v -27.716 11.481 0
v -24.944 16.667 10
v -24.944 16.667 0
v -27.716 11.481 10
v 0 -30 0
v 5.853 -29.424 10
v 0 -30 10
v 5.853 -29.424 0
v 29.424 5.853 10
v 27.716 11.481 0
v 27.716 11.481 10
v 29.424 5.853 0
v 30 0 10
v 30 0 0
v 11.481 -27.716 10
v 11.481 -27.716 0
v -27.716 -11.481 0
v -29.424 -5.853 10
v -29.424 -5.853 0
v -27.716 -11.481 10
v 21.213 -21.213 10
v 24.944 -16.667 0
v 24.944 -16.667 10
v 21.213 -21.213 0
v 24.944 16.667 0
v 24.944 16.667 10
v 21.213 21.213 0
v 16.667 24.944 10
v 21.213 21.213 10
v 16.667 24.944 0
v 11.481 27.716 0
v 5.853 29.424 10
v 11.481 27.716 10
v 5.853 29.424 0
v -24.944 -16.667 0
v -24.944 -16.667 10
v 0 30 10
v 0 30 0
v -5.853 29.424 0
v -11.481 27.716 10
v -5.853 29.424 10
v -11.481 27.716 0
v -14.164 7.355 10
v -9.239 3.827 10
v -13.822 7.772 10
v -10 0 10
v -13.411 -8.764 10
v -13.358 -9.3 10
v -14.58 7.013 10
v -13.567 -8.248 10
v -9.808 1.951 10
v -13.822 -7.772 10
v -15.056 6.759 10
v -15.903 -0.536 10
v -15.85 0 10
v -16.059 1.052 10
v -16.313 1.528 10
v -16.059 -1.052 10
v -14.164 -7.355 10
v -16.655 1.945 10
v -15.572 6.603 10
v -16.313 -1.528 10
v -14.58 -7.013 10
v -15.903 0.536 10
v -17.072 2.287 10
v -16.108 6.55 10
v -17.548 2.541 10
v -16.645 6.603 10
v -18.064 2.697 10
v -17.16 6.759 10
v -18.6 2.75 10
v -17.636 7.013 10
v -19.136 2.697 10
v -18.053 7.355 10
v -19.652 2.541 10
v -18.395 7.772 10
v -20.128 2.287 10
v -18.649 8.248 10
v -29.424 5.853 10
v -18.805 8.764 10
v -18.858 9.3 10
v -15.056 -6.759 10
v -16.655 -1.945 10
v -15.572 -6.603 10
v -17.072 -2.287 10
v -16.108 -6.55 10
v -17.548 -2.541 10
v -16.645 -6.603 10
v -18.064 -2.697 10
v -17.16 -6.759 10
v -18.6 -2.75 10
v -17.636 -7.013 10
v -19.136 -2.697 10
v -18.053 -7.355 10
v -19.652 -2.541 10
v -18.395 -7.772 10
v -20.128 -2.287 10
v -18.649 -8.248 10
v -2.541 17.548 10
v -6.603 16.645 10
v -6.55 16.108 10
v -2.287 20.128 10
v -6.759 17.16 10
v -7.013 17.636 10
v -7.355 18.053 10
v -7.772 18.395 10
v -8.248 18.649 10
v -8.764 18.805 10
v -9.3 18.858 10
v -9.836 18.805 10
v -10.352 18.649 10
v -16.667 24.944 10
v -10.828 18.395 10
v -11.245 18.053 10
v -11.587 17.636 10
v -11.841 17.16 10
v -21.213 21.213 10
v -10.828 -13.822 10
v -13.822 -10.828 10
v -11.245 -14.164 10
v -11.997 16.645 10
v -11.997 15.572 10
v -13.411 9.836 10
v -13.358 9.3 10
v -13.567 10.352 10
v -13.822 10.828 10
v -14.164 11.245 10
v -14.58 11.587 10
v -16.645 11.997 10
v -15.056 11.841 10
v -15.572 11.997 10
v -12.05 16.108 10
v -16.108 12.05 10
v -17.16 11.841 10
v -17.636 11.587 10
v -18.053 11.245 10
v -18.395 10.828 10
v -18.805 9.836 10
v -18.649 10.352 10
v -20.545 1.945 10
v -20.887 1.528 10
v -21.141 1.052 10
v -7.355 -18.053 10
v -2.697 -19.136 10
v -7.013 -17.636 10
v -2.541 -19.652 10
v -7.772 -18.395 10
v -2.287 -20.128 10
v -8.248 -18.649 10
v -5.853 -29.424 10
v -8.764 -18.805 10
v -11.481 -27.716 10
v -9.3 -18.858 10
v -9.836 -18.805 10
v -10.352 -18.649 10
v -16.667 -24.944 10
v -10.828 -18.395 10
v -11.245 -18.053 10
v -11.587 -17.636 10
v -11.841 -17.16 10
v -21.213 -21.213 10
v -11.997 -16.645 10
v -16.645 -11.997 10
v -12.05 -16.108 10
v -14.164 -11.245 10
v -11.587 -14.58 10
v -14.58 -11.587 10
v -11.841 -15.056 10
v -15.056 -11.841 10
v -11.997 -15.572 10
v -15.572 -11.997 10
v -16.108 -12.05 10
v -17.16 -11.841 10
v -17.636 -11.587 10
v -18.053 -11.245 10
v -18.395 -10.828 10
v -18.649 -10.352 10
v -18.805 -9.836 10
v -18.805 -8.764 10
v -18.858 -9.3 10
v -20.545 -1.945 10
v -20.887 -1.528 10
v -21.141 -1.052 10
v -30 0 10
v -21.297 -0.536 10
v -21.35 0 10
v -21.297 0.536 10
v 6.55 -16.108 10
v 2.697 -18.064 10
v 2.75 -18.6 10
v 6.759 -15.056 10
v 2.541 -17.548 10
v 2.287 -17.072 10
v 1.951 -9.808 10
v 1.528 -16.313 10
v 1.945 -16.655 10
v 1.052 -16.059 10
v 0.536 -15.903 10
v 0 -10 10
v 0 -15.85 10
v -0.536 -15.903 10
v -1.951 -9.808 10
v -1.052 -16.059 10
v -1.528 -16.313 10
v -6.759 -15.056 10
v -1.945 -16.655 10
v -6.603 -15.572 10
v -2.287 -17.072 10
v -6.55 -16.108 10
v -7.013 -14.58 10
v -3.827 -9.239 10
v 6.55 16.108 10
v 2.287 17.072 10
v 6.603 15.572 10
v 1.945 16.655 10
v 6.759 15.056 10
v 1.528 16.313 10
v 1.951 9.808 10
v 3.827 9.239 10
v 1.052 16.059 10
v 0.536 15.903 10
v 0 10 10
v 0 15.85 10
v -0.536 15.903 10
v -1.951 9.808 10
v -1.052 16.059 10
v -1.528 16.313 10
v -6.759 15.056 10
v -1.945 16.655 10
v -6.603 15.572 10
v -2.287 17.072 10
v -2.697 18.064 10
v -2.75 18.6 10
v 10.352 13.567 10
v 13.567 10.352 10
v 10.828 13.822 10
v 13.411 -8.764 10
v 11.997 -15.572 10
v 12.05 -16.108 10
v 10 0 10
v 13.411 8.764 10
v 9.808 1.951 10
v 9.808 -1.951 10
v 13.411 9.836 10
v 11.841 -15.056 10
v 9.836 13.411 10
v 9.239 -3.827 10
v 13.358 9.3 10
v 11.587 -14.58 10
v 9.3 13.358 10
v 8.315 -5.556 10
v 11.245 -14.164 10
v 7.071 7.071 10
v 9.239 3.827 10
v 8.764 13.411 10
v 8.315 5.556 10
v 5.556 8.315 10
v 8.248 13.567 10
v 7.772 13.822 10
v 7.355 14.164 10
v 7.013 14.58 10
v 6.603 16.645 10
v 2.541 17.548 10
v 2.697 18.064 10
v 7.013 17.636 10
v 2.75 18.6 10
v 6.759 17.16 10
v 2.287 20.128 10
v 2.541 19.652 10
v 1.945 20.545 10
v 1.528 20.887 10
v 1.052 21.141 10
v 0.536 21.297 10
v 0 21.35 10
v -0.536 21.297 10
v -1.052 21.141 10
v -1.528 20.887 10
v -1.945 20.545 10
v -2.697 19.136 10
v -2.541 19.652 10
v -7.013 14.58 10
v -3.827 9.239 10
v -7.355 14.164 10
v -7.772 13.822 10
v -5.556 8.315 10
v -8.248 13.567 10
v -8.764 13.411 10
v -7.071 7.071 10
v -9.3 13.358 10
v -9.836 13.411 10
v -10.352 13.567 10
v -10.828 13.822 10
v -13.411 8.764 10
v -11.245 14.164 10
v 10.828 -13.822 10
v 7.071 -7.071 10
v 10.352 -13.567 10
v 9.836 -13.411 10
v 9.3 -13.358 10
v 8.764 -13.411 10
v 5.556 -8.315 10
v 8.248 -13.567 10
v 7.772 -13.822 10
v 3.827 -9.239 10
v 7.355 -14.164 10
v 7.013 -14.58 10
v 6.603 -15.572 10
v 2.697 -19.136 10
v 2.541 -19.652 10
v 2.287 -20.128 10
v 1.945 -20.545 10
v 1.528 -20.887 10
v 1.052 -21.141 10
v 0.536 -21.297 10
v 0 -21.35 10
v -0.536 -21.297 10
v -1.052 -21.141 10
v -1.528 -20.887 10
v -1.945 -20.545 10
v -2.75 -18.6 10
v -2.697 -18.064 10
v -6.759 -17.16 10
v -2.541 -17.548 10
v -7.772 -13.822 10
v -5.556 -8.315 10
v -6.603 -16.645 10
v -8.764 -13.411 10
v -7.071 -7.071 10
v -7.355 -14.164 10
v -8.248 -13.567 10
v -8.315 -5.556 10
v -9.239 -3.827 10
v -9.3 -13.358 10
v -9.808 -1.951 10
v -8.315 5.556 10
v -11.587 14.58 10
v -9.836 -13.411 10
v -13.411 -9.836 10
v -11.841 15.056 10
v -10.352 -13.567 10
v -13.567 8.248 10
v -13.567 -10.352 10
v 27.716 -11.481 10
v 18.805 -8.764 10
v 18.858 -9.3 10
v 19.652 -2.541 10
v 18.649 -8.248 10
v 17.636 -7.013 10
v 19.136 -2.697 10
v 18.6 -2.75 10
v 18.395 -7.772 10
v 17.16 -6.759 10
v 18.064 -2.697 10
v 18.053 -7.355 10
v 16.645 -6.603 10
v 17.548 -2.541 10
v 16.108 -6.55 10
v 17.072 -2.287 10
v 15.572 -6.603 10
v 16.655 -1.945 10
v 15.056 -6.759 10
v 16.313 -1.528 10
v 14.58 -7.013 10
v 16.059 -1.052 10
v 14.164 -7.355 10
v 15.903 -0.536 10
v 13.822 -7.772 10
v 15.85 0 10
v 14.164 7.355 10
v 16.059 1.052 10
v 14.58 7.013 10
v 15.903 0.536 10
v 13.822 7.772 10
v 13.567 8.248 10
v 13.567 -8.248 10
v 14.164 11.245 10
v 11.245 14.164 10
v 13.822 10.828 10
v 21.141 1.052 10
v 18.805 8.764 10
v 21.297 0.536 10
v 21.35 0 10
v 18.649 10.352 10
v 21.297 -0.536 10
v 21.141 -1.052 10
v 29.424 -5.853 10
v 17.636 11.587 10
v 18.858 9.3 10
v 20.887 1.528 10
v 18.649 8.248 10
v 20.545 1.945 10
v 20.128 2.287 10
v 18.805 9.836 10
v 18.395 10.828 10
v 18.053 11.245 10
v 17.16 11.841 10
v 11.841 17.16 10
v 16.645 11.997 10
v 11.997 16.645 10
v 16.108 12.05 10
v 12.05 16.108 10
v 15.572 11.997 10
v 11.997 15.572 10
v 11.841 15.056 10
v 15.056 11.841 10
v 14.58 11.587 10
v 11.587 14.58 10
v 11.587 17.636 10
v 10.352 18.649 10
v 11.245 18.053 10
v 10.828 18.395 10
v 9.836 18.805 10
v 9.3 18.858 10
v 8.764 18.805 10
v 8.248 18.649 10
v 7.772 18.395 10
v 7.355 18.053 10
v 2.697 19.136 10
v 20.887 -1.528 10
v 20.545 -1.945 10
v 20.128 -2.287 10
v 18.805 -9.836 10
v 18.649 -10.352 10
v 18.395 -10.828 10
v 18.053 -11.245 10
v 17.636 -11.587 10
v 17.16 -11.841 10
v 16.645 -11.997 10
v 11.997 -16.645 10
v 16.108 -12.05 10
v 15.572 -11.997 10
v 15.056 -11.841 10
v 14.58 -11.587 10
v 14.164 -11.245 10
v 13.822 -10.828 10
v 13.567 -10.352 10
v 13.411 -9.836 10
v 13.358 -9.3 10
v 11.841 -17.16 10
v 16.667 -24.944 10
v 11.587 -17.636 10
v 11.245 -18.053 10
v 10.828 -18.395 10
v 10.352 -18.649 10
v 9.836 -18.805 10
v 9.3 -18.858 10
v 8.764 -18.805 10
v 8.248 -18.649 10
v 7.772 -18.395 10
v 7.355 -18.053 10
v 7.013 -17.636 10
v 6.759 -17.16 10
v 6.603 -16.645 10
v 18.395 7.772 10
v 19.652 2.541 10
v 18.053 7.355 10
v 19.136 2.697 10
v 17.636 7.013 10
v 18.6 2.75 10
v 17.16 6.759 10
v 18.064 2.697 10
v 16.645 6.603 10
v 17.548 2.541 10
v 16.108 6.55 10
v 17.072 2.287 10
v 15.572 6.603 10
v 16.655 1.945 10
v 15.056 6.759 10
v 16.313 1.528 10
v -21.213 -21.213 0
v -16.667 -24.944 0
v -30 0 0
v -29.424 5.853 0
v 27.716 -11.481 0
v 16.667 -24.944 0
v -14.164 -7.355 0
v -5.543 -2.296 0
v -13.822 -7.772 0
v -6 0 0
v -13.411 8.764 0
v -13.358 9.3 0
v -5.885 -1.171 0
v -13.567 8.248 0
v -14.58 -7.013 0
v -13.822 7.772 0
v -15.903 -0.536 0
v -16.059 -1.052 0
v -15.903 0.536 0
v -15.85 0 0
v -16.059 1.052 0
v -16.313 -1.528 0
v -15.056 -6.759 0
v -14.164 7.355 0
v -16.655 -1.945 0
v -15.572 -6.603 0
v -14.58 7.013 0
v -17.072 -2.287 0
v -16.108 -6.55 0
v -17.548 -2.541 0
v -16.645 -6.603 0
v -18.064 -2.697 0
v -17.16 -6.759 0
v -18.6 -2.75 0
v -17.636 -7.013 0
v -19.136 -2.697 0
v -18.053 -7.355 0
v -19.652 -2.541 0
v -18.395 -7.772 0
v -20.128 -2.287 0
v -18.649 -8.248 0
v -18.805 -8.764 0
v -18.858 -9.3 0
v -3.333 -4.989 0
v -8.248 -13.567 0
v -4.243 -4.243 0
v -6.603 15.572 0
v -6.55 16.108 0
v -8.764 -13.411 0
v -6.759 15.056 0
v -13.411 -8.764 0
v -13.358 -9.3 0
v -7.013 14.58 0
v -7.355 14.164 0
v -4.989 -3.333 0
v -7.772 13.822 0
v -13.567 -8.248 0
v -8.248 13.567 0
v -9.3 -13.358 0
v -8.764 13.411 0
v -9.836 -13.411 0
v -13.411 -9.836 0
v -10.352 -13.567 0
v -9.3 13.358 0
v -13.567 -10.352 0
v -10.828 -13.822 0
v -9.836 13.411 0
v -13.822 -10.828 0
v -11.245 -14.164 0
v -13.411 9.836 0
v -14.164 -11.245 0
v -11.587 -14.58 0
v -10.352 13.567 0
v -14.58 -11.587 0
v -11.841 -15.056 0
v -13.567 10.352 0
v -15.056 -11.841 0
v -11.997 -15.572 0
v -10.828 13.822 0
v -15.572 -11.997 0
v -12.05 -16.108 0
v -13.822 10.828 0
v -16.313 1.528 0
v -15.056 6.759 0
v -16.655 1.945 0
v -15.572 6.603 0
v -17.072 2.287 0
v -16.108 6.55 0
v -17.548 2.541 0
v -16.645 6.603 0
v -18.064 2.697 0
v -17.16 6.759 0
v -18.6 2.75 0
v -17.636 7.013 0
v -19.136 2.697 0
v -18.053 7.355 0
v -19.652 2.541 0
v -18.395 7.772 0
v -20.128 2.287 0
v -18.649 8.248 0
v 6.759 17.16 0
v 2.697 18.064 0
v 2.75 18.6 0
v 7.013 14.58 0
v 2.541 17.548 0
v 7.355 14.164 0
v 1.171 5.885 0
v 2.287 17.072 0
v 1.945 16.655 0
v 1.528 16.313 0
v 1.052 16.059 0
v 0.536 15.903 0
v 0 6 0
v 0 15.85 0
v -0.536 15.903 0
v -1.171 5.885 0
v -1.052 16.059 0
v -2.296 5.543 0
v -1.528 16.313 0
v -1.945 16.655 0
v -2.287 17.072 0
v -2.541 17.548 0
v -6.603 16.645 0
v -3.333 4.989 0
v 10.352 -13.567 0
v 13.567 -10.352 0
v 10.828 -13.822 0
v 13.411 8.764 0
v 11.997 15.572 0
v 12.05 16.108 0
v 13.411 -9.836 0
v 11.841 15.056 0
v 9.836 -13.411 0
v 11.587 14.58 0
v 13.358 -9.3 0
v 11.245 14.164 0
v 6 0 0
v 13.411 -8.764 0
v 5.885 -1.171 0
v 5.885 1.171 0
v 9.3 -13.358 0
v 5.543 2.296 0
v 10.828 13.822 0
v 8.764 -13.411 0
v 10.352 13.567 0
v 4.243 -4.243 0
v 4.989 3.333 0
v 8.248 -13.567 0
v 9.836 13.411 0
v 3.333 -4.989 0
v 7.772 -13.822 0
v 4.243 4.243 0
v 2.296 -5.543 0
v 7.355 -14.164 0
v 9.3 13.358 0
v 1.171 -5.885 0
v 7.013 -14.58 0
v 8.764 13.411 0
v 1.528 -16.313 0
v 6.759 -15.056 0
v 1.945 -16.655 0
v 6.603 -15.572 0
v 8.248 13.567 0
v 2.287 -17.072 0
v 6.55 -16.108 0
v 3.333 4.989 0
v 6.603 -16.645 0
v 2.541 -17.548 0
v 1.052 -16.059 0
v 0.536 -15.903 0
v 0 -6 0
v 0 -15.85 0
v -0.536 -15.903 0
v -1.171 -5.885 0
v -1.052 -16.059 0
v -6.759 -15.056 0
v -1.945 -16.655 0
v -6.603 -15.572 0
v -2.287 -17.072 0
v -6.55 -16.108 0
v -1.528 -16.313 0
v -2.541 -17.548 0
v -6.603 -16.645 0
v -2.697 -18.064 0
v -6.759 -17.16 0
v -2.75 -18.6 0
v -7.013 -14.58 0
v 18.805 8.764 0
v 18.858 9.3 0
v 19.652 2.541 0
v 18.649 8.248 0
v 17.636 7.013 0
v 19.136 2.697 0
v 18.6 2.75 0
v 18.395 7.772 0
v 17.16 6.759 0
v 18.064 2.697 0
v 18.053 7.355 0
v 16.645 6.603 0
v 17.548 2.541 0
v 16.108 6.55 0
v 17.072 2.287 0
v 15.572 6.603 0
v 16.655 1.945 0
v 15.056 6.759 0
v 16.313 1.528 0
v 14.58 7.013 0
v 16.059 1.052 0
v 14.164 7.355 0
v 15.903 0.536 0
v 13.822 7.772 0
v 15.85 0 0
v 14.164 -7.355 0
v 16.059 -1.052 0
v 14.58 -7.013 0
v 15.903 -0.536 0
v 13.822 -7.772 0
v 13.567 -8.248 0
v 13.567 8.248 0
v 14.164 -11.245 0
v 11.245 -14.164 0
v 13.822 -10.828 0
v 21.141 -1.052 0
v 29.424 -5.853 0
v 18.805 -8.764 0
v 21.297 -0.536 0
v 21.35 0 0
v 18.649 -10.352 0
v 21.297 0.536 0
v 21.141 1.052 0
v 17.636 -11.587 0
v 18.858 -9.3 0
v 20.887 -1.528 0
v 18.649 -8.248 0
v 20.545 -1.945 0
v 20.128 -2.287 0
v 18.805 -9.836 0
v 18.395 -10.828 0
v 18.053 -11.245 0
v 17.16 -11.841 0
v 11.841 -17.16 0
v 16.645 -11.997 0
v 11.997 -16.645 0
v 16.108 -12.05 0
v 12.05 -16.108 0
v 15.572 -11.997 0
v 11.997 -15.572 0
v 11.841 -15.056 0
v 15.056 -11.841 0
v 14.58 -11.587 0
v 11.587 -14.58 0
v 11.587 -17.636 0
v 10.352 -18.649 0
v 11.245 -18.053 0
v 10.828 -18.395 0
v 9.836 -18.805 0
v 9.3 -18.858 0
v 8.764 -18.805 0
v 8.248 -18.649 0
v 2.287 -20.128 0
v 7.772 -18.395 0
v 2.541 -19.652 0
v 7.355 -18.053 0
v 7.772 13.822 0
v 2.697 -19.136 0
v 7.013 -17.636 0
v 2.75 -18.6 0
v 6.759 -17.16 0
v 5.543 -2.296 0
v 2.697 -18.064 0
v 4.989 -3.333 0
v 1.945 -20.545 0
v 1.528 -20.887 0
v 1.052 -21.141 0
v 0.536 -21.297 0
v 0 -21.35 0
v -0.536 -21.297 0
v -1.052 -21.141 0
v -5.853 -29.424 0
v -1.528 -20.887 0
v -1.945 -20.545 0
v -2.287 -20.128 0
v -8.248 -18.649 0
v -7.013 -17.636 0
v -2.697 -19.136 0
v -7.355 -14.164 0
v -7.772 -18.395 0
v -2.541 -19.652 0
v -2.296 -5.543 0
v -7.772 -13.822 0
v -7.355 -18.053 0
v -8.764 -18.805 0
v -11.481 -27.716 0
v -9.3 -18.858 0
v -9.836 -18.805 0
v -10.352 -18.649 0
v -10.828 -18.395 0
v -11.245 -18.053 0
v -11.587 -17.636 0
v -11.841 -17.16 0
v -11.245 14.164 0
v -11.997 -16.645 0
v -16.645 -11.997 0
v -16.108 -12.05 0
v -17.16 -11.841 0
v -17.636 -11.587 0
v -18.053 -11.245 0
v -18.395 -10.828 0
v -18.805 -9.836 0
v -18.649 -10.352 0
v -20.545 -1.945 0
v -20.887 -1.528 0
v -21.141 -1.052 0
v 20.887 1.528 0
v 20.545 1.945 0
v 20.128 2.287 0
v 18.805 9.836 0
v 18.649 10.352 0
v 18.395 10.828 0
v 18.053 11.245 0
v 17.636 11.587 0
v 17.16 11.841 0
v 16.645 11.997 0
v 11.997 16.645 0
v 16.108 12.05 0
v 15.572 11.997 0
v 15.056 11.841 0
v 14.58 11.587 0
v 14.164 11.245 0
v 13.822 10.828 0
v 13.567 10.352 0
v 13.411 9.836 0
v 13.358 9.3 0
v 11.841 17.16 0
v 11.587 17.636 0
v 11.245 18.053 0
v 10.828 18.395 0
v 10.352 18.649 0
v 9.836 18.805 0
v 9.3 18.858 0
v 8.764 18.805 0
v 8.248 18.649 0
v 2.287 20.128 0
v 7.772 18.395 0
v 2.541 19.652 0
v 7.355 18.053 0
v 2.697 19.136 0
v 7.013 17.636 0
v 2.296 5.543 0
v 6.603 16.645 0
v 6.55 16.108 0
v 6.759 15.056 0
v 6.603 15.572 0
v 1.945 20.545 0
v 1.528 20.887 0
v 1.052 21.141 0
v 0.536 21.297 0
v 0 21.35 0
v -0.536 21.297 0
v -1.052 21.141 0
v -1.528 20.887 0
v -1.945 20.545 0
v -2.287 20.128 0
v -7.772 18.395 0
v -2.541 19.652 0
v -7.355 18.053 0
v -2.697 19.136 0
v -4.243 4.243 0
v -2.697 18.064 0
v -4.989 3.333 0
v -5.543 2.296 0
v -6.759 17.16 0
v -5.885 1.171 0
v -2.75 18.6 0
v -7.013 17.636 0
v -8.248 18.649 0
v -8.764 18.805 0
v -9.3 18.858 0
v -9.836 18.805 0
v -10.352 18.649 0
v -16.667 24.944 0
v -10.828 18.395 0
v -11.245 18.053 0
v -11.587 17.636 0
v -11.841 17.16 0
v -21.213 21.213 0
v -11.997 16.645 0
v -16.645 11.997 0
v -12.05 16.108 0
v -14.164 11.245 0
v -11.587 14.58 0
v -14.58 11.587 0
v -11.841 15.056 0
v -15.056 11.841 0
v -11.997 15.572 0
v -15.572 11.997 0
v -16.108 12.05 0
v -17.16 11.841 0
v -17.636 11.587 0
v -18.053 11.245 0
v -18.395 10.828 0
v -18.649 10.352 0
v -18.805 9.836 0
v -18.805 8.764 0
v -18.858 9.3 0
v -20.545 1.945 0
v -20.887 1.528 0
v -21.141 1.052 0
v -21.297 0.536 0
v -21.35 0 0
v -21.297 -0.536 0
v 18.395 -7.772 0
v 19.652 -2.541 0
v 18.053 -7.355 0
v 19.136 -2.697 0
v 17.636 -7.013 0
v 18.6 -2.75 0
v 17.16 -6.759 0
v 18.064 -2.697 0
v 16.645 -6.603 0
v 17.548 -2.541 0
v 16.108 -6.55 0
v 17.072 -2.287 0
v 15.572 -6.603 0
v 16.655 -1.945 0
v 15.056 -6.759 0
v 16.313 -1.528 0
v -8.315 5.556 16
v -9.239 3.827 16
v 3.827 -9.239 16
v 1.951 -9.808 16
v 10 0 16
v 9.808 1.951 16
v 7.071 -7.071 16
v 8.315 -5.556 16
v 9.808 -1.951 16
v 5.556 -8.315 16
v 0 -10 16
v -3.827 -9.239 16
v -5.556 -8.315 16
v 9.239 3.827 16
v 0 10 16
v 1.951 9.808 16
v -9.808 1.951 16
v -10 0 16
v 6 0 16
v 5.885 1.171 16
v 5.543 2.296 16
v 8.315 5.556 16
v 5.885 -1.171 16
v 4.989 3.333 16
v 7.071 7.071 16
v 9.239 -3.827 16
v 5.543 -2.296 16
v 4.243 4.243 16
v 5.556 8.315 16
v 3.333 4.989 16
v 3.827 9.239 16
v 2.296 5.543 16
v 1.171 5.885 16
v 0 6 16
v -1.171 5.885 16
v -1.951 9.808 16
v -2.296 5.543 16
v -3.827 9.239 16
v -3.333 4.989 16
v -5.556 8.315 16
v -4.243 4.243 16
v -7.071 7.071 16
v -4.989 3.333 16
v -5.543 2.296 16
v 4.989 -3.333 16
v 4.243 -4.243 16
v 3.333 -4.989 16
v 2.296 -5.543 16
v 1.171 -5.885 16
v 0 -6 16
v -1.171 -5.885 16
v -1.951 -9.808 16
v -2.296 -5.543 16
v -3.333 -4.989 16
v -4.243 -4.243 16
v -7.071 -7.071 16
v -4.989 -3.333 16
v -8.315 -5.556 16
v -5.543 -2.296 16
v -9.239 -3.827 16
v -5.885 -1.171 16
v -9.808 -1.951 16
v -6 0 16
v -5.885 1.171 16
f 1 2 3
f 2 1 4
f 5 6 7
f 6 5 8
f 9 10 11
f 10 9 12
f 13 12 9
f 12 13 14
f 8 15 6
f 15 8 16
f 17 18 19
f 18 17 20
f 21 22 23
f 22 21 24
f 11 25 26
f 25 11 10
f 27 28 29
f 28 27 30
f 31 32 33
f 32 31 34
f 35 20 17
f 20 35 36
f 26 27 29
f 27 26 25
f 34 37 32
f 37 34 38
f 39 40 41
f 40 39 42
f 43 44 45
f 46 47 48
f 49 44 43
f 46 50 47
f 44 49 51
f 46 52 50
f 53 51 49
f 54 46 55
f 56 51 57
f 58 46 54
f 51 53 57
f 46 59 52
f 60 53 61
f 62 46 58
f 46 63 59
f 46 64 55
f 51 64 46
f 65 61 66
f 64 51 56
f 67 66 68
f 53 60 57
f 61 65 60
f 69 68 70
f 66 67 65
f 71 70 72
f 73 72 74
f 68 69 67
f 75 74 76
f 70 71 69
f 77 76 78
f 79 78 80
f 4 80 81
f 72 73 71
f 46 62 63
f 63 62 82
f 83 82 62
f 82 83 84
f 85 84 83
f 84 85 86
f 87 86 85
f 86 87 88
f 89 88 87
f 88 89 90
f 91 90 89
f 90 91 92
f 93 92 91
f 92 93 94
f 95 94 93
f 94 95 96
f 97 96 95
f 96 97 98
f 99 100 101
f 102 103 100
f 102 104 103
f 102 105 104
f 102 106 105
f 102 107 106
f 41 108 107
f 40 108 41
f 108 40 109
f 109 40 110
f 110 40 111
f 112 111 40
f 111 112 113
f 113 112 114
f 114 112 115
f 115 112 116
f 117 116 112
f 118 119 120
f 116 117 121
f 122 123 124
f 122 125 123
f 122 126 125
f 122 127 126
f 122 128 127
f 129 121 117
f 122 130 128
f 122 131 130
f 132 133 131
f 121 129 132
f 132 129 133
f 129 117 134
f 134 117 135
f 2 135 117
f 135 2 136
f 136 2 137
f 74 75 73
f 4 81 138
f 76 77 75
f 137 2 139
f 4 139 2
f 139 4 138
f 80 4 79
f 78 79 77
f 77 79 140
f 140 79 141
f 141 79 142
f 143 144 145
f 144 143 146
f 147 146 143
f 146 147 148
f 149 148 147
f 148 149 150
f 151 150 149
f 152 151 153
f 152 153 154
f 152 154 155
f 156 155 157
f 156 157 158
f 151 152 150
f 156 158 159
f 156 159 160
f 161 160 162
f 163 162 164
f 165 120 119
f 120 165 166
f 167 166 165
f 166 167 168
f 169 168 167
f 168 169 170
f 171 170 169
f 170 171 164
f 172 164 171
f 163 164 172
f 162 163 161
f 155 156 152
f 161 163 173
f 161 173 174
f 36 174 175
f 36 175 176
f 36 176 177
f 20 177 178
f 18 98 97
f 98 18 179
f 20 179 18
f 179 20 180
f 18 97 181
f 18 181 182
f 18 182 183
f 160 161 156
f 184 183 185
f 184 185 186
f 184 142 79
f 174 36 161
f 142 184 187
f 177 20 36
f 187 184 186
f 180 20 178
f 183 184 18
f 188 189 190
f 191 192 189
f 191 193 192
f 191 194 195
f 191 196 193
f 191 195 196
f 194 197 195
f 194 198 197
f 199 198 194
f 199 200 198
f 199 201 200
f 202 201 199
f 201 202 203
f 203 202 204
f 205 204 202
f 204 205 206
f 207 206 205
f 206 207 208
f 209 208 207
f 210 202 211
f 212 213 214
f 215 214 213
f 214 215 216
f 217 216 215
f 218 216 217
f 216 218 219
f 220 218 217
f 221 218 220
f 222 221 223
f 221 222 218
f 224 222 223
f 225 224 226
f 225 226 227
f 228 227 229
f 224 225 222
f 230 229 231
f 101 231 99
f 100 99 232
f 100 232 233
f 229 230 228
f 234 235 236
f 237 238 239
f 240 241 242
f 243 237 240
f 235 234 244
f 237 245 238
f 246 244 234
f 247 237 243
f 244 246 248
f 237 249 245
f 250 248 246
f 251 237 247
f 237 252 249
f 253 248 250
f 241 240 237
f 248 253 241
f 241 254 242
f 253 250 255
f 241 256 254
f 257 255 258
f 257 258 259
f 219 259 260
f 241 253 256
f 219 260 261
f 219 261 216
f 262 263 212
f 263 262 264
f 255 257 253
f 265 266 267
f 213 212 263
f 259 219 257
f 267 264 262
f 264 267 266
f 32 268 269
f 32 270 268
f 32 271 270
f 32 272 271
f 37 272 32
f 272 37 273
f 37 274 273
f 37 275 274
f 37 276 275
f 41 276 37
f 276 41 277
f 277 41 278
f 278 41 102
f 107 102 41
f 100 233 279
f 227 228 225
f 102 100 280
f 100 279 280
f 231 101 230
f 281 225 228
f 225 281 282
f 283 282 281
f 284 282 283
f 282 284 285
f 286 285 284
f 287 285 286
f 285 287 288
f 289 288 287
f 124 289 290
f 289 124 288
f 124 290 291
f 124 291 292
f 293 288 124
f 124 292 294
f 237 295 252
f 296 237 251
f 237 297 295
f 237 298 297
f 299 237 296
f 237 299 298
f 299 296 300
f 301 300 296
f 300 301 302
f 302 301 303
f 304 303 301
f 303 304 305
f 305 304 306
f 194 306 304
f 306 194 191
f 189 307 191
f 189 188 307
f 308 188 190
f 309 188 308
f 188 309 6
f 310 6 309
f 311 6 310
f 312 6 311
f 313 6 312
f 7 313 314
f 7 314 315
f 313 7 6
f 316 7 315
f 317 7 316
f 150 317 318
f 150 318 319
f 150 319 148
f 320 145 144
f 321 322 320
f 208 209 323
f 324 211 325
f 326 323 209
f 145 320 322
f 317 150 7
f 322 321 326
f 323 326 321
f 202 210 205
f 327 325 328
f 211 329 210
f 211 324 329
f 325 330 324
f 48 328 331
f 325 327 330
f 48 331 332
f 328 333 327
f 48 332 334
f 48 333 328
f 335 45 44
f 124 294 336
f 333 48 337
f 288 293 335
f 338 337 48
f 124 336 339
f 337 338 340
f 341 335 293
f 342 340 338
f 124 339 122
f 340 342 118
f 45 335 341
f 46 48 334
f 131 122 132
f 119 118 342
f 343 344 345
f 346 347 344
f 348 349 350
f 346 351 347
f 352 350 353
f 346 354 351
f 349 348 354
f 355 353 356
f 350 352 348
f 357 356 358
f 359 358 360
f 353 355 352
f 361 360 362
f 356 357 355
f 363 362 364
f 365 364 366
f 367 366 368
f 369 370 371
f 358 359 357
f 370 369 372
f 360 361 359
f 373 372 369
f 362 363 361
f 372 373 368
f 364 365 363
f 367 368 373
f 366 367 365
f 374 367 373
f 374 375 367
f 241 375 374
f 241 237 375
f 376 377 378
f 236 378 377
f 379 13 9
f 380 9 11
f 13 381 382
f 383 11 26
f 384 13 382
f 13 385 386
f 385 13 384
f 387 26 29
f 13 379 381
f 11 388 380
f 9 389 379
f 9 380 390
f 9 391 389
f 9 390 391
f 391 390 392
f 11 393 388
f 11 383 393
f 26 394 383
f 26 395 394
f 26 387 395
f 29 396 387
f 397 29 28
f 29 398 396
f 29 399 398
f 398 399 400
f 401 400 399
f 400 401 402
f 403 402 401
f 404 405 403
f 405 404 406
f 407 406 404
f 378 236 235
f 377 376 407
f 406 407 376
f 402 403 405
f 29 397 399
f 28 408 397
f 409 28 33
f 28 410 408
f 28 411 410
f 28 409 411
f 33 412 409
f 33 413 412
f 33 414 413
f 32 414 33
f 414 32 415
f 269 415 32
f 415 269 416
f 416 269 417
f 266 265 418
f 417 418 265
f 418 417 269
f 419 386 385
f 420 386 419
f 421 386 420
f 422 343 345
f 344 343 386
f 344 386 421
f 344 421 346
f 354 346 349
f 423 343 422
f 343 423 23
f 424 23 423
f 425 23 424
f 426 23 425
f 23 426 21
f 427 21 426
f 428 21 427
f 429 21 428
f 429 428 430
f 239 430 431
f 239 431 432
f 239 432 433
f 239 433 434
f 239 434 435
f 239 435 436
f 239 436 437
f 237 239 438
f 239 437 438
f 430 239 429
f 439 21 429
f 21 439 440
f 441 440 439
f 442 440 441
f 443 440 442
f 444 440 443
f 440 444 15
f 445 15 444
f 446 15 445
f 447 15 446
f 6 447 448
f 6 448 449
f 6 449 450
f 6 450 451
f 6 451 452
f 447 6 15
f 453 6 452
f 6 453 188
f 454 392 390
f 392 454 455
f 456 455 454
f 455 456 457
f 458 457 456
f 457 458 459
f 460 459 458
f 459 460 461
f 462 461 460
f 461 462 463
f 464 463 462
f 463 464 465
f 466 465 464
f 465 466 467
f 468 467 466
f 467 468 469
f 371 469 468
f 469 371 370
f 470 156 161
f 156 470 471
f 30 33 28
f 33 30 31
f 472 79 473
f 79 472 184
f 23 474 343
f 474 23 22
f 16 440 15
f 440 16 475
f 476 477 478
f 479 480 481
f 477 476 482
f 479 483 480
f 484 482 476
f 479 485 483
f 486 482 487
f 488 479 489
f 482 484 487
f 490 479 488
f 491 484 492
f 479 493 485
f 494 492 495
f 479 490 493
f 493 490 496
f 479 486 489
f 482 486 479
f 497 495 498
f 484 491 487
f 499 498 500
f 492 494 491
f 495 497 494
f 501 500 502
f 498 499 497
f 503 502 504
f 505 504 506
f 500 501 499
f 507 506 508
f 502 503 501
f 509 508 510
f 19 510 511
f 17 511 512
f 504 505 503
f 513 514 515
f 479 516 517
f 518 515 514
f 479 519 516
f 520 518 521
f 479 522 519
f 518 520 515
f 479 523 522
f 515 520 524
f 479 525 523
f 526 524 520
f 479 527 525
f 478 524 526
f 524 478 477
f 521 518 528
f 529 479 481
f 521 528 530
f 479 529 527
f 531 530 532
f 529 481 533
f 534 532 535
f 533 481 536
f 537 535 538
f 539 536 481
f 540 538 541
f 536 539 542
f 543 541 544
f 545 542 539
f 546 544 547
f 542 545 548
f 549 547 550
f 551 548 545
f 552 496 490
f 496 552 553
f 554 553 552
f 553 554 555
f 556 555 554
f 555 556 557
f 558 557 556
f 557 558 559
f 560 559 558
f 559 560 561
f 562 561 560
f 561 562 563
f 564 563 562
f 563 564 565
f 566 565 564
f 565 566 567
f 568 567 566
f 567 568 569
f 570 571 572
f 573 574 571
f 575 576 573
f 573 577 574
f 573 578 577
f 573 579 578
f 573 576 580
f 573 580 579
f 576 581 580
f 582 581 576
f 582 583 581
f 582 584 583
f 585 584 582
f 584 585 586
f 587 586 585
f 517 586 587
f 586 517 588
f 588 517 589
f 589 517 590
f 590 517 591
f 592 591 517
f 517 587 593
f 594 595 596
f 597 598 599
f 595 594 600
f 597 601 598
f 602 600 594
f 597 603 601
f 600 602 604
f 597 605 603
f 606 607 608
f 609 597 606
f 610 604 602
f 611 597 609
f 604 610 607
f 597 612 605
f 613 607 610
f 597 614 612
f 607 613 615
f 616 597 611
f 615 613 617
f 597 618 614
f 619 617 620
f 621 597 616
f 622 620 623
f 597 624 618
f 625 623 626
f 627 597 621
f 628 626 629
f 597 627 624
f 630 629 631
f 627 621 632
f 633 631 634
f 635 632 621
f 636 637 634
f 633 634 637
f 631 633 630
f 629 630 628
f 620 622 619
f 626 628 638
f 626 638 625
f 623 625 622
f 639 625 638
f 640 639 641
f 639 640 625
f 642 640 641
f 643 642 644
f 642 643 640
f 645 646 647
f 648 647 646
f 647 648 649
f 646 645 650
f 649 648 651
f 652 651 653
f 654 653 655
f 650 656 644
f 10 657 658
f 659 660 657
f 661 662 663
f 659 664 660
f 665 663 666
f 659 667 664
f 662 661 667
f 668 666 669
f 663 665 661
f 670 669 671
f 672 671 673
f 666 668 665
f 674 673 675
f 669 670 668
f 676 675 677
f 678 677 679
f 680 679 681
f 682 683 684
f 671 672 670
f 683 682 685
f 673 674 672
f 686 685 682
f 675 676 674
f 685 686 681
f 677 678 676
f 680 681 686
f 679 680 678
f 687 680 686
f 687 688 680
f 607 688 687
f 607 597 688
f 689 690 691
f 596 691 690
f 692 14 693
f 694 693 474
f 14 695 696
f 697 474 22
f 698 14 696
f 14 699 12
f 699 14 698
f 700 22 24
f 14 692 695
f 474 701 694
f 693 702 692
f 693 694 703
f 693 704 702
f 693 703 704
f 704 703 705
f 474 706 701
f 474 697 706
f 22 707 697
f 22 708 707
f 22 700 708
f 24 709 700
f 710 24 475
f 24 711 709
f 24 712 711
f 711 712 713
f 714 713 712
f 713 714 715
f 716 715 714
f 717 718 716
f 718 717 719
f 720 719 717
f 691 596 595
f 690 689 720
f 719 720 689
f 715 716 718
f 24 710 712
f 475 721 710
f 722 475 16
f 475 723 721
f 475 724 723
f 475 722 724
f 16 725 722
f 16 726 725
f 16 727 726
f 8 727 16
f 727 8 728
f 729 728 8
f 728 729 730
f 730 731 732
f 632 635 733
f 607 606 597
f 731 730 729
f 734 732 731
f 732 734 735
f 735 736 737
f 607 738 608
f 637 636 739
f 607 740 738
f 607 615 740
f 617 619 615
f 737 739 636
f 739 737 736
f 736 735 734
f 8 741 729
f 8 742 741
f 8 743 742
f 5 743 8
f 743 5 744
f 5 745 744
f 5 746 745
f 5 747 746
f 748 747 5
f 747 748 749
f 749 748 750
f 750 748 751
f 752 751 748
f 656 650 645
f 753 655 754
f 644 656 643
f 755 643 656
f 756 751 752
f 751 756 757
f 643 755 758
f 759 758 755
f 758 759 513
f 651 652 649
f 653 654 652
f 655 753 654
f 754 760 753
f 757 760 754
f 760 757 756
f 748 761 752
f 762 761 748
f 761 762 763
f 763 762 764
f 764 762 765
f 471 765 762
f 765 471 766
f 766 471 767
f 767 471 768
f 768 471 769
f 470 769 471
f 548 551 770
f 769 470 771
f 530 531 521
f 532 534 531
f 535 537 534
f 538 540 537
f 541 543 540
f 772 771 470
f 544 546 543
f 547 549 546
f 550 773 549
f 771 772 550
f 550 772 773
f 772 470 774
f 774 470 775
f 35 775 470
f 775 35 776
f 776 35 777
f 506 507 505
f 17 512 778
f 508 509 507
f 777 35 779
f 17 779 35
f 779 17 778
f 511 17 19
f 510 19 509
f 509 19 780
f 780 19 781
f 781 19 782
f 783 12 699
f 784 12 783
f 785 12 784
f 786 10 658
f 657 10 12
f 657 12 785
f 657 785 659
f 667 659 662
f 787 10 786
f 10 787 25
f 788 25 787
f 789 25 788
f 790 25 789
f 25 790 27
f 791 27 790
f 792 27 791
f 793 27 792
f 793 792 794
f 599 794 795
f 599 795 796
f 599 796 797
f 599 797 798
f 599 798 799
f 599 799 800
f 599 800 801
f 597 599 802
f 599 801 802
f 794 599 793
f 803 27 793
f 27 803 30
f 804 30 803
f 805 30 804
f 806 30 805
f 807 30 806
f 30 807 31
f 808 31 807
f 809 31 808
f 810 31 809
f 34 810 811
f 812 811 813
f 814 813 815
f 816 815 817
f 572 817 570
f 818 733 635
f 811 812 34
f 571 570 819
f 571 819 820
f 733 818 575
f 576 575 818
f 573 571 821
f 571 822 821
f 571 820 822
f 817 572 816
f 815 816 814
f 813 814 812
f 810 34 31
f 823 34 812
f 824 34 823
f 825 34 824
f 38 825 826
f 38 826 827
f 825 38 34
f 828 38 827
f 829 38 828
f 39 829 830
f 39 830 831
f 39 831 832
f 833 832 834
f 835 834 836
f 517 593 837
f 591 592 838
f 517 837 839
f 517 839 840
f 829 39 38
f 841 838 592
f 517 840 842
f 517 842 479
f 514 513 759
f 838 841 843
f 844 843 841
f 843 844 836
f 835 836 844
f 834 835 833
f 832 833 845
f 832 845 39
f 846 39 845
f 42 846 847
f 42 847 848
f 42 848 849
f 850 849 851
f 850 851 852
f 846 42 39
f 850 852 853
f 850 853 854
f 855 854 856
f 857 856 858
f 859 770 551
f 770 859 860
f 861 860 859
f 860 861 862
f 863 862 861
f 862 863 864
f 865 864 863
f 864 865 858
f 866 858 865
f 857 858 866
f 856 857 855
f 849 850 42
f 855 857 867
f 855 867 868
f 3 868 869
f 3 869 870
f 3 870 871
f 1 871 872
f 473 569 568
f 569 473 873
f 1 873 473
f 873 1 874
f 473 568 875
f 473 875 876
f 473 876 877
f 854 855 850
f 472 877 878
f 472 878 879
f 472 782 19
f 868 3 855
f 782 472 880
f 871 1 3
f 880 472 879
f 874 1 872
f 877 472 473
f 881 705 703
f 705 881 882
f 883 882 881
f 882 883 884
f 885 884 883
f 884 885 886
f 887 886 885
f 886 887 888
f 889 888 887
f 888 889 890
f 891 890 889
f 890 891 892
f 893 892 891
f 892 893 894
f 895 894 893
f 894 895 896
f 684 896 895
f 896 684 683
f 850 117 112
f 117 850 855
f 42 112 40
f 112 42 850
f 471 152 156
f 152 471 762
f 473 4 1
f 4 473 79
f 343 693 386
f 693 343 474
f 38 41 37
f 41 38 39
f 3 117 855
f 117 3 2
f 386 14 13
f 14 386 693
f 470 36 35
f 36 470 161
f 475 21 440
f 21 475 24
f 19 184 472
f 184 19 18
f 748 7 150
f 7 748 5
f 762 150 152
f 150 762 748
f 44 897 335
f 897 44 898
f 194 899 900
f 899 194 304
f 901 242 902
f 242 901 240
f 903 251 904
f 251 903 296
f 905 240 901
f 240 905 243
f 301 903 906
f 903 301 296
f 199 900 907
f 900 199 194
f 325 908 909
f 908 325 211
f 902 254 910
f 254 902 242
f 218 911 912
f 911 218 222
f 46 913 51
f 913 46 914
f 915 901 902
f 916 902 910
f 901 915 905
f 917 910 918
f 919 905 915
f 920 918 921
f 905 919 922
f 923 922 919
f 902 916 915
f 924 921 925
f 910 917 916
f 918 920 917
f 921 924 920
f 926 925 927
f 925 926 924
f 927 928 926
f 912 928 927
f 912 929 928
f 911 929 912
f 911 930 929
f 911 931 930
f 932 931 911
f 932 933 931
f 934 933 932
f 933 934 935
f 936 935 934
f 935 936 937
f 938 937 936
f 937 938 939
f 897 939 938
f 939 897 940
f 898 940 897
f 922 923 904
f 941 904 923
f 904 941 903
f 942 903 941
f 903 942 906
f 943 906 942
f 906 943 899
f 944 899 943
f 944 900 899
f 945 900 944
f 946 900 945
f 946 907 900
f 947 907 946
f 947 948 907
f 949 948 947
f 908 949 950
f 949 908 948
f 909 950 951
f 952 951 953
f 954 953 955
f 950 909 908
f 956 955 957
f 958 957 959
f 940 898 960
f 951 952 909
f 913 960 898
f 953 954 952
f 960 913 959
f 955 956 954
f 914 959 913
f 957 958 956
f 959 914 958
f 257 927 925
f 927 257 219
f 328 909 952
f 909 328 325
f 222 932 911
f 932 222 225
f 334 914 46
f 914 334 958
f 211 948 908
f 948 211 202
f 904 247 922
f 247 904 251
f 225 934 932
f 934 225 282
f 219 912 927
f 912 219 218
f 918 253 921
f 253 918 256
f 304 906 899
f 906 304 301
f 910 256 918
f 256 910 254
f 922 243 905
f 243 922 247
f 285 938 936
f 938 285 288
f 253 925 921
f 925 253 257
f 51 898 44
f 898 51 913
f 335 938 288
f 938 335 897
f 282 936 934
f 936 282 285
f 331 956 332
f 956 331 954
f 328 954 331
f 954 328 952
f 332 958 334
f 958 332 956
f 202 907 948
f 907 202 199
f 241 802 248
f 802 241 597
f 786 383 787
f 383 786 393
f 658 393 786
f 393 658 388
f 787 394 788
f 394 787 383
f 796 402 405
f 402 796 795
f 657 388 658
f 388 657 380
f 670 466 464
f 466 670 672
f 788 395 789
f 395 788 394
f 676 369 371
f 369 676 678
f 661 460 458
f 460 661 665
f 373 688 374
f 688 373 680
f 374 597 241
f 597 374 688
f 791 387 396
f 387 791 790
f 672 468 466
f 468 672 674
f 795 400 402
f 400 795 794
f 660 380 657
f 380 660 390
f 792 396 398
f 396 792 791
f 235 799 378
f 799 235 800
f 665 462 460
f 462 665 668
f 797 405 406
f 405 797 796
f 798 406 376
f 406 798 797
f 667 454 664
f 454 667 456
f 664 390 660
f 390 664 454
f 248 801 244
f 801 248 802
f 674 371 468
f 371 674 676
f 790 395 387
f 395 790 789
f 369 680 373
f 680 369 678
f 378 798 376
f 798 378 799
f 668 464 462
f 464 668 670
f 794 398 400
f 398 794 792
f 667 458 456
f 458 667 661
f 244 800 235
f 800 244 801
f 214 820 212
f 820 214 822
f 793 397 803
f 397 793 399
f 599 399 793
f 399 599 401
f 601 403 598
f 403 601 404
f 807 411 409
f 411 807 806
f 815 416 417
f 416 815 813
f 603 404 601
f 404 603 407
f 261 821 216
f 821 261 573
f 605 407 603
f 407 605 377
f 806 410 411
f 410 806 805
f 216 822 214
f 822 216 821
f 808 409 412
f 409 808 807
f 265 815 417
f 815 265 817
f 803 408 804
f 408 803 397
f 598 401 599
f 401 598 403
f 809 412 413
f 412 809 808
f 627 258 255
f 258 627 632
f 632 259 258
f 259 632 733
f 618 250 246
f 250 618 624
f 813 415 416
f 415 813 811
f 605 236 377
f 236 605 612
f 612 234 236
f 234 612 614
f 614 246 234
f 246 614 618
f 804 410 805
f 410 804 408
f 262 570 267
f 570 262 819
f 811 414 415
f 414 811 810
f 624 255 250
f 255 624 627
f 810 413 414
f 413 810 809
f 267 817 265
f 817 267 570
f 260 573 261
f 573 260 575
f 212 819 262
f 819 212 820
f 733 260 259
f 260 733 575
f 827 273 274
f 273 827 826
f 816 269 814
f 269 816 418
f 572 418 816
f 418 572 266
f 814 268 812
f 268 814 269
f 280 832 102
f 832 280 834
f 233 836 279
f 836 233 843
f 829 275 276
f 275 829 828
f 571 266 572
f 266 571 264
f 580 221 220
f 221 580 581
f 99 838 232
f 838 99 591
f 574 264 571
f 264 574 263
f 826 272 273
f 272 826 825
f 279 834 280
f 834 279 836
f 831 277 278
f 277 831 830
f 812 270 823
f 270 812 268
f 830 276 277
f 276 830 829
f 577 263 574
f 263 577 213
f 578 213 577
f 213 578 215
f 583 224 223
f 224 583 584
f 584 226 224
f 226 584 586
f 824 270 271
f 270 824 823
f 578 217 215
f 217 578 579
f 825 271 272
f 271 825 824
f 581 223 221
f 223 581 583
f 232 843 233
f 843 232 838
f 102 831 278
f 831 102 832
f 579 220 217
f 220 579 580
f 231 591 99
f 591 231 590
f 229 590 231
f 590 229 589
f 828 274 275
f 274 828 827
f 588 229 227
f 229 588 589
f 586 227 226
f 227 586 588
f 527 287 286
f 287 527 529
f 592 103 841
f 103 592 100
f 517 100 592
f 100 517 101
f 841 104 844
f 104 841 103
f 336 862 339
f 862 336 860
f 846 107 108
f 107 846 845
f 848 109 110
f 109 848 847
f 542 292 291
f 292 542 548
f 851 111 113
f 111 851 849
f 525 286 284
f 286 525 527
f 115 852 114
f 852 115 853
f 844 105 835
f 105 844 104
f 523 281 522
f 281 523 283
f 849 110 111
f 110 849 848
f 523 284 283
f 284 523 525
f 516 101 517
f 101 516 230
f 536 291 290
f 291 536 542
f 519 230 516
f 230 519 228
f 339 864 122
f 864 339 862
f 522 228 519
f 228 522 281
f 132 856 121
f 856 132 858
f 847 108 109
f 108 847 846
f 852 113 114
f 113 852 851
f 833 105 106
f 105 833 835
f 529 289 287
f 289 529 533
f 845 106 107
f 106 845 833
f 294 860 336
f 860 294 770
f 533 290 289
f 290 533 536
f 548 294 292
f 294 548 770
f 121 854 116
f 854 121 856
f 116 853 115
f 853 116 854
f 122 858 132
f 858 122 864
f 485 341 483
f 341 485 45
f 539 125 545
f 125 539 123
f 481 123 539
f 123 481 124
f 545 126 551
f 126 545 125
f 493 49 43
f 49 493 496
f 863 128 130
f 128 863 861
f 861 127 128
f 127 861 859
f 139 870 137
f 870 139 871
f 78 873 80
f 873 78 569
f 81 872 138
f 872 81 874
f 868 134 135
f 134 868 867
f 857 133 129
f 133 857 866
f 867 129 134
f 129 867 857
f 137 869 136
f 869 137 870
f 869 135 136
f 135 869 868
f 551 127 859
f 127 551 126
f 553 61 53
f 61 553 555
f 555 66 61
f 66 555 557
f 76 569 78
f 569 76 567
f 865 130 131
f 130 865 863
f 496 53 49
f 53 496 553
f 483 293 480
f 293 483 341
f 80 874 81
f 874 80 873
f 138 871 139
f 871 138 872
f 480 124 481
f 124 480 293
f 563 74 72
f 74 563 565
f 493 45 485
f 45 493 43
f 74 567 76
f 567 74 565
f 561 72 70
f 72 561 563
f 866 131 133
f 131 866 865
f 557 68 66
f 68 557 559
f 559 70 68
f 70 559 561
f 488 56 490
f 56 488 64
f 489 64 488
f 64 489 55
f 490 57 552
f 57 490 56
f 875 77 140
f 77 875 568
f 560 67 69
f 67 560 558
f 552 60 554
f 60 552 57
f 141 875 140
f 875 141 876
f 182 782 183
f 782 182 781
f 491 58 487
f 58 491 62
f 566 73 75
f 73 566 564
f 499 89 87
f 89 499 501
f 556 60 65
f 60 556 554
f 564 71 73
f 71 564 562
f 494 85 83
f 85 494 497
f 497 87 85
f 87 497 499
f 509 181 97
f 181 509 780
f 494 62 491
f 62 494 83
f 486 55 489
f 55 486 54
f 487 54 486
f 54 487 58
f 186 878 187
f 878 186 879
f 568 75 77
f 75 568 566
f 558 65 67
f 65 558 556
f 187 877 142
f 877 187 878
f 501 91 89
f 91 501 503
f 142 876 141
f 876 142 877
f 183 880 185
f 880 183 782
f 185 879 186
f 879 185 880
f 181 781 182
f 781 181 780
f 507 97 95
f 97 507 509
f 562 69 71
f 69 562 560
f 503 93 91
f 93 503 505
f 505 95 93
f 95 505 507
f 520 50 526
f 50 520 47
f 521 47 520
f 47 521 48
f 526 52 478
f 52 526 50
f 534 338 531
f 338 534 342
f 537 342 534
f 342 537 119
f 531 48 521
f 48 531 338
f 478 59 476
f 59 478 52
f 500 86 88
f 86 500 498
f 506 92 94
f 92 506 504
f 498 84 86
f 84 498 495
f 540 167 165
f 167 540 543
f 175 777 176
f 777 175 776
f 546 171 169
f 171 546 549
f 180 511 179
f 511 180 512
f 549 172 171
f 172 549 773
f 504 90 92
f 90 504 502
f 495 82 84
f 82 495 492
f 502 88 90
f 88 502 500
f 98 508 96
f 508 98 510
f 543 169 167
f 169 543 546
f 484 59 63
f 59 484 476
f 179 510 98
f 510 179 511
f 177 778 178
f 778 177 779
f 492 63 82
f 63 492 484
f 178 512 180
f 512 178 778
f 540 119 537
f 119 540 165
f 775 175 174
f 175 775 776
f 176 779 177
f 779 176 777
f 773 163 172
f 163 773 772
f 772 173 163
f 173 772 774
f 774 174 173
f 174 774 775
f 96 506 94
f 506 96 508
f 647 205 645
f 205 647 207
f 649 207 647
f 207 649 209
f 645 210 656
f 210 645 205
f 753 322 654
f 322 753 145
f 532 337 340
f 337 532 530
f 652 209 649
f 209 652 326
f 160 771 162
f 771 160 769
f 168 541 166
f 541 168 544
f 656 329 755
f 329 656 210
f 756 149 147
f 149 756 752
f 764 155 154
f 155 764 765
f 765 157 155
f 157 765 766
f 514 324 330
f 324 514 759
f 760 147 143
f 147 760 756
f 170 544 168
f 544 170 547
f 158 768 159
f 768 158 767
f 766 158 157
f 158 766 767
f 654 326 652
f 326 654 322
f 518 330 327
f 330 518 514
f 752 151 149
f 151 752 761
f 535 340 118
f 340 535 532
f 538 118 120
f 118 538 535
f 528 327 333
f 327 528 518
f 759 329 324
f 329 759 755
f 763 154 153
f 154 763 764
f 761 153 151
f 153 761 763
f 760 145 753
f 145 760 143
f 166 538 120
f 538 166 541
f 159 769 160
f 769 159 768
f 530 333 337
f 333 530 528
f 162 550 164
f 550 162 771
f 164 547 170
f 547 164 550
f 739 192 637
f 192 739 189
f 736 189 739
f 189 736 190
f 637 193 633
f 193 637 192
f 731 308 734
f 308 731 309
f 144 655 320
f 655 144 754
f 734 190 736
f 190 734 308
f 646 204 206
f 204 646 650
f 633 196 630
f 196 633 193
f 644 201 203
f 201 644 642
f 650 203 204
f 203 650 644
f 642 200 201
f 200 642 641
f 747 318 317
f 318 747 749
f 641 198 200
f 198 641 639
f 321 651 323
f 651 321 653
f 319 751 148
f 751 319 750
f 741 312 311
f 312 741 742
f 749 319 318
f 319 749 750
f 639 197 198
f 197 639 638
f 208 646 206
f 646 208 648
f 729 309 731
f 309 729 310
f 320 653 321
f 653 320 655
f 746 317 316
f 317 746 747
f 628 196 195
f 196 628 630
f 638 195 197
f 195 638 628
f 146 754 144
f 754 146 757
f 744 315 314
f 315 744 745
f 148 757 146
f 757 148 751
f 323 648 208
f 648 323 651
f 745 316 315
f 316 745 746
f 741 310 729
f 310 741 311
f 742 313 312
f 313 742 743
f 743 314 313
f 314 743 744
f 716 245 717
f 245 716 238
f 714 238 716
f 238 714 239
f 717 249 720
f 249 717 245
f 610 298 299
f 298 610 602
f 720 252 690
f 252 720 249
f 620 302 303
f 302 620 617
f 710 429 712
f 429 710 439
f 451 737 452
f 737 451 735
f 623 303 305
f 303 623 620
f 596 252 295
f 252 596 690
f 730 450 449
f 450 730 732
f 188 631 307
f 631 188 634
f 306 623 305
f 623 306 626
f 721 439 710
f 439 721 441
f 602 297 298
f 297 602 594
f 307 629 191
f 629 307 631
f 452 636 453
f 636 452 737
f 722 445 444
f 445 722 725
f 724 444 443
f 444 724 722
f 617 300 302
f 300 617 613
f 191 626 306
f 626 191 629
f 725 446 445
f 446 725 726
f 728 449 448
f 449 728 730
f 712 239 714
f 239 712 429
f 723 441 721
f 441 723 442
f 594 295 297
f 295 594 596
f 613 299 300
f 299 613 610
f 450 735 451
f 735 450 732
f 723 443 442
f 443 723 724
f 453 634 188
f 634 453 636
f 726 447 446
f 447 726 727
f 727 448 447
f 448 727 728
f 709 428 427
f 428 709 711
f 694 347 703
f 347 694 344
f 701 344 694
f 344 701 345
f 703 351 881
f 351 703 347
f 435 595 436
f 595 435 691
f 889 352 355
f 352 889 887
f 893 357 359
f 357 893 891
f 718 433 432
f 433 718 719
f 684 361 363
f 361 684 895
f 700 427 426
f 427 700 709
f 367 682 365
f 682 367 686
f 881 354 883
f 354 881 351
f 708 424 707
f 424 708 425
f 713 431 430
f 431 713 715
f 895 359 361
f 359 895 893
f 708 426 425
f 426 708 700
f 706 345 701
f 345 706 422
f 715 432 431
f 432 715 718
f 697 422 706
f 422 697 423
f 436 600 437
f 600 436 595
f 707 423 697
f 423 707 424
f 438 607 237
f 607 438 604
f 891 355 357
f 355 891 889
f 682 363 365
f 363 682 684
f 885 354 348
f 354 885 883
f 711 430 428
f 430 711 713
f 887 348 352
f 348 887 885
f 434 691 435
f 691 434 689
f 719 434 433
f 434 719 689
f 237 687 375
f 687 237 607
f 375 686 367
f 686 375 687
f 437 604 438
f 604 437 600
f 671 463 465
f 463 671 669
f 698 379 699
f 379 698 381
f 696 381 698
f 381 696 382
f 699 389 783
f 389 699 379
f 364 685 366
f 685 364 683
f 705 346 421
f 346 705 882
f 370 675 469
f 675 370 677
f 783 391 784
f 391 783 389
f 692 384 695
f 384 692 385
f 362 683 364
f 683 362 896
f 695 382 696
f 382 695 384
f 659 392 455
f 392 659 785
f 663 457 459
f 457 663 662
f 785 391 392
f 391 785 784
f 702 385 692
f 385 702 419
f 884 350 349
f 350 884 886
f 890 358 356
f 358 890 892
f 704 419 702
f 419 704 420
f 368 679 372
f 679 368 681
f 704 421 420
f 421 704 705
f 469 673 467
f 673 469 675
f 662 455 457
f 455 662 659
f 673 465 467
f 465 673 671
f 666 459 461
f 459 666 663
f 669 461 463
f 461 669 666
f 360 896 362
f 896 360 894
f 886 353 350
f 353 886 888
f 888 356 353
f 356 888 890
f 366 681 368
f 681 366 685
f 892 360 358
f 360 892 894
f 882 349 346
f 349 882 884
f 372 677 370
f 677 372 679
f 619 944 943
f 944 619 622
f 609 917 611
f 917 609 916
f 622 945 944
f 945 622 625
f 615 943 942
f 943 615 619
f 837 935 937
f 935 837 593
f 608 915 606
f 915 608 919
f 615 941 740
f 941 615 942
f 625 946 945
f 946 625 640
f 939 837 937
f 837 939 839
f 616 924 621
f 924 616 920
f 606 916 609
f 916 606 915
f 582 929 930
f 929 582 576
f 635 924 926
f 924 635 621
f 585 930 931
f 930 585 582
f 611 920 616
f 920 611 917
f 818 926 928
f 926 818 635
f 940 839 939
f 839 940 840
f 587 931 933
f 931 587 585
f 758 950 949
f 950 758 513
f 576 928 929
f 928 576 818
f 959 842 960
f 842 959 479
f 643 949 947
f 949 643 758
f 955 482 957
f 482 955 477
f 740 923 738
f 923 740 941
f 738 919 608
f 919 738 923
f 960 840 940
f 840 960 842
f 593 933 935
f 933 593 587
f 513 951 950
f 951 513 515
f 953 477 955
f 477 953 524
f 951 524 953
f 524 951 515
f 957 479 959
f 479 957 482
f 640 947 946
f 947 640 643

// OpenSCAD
$fn = 32;

// ----------------------------------------------------------------------
// Flange Ø60 x 10
// 12 holes on a Ø37.2 bolt circle, bolted joints
// ----------------------------------------------------------------------

// --- parameters (mm) ---
flange_d = 60;   // outside diameter of the flange
thickness = 10;  // flange thickness
holes = 12;      // number of bolt holes
pcd = 37.2;      // bolt circle diameter
start_deg = 30;  // angle of the first hole, from +X
hole_d = 5.5;    // bolt hole diameter
bore_d = 12;     // central through bore
hub_d = 20;      // hub outside diameter
hub_h = 6;       // hub height above the flange face (0 = no hub)

// --- derived feature positions (mm) ---
height = thickness + hub_h;  // = 16   overall height of the part
pcd_r = pcd / 2;             // = 18.6   bolt circle radius
hole_step = 360 / holes;     // = 30   angular pitch
feature_centers = [
  [pcd_r * cos(start_deg + 0 * hole_step), pcd_r * sin(start_deg + 0 * hole_step)],
  [pcd_r * cos(start_deg + 1 * hole_step), pcd_r * sin(start_deg + 1 * hole_step)],
  [pcd_r * cos(start_deg + 2 * hole_step), pcd_r * sin(start_deg + 2 * hole_step)],
  [pcd_r * cos(start_deg + 3 * hole_step), pcd_r * sin(start_deg + 3 * hole_step)],
  [pcd_r * cos(start_deg + 4 * hole_step), pcd_r * sin(start_deg + 4 * hole_step)],
  [pcd_r * cos(start_deg + 5 * hole_step), pcd_r * sin(start_deg + 5 * hole_step)],
  [pcd_r * cos(start_deg + 6 * hole_step), pcd_r * sin(start_deg + 6 * hole_step)],
  [pcd_r * cos(start_deg + 7 * hole_step), pcd_r * sin(start_deg + 7 * hole_step)],
  [pcd_r * cos(start_deg + 8 * hole_step), pcd_r * sin(start_deg + 8 * hole_step)],
  [pcd_r * cos(start_deg + 9 * hole_step), pcd_r * sin(start_deg + 9 * hole_step)],
  [pcd_r * cos(start_deg + 10 * hole_step), pcd_r * sin(start_deg + 10 * hole_step)],
  [pcd_r * cos(start_deg + 11 * hole_step), pcd_r * sin(start_deg + 11 * hole_step)]
];   // bolt hole centres on the pitch circle

// flange disc, every hole and the bore cut straight through
difference() {
  union() {
    cylinder(d = flange_d, h = thickness);
    cylinder(d = hub_d, h = height);  // hub, overlapped into the flange
  }
  translate([0, 0, -1]) cylinder(d = bore_d, h = height + 2);  // bore, through
  for (centre = feature_centers)
    translate([centre[0], centre[1], -1]) cylinder(d = hole_d, h = thickness + 2);
}
